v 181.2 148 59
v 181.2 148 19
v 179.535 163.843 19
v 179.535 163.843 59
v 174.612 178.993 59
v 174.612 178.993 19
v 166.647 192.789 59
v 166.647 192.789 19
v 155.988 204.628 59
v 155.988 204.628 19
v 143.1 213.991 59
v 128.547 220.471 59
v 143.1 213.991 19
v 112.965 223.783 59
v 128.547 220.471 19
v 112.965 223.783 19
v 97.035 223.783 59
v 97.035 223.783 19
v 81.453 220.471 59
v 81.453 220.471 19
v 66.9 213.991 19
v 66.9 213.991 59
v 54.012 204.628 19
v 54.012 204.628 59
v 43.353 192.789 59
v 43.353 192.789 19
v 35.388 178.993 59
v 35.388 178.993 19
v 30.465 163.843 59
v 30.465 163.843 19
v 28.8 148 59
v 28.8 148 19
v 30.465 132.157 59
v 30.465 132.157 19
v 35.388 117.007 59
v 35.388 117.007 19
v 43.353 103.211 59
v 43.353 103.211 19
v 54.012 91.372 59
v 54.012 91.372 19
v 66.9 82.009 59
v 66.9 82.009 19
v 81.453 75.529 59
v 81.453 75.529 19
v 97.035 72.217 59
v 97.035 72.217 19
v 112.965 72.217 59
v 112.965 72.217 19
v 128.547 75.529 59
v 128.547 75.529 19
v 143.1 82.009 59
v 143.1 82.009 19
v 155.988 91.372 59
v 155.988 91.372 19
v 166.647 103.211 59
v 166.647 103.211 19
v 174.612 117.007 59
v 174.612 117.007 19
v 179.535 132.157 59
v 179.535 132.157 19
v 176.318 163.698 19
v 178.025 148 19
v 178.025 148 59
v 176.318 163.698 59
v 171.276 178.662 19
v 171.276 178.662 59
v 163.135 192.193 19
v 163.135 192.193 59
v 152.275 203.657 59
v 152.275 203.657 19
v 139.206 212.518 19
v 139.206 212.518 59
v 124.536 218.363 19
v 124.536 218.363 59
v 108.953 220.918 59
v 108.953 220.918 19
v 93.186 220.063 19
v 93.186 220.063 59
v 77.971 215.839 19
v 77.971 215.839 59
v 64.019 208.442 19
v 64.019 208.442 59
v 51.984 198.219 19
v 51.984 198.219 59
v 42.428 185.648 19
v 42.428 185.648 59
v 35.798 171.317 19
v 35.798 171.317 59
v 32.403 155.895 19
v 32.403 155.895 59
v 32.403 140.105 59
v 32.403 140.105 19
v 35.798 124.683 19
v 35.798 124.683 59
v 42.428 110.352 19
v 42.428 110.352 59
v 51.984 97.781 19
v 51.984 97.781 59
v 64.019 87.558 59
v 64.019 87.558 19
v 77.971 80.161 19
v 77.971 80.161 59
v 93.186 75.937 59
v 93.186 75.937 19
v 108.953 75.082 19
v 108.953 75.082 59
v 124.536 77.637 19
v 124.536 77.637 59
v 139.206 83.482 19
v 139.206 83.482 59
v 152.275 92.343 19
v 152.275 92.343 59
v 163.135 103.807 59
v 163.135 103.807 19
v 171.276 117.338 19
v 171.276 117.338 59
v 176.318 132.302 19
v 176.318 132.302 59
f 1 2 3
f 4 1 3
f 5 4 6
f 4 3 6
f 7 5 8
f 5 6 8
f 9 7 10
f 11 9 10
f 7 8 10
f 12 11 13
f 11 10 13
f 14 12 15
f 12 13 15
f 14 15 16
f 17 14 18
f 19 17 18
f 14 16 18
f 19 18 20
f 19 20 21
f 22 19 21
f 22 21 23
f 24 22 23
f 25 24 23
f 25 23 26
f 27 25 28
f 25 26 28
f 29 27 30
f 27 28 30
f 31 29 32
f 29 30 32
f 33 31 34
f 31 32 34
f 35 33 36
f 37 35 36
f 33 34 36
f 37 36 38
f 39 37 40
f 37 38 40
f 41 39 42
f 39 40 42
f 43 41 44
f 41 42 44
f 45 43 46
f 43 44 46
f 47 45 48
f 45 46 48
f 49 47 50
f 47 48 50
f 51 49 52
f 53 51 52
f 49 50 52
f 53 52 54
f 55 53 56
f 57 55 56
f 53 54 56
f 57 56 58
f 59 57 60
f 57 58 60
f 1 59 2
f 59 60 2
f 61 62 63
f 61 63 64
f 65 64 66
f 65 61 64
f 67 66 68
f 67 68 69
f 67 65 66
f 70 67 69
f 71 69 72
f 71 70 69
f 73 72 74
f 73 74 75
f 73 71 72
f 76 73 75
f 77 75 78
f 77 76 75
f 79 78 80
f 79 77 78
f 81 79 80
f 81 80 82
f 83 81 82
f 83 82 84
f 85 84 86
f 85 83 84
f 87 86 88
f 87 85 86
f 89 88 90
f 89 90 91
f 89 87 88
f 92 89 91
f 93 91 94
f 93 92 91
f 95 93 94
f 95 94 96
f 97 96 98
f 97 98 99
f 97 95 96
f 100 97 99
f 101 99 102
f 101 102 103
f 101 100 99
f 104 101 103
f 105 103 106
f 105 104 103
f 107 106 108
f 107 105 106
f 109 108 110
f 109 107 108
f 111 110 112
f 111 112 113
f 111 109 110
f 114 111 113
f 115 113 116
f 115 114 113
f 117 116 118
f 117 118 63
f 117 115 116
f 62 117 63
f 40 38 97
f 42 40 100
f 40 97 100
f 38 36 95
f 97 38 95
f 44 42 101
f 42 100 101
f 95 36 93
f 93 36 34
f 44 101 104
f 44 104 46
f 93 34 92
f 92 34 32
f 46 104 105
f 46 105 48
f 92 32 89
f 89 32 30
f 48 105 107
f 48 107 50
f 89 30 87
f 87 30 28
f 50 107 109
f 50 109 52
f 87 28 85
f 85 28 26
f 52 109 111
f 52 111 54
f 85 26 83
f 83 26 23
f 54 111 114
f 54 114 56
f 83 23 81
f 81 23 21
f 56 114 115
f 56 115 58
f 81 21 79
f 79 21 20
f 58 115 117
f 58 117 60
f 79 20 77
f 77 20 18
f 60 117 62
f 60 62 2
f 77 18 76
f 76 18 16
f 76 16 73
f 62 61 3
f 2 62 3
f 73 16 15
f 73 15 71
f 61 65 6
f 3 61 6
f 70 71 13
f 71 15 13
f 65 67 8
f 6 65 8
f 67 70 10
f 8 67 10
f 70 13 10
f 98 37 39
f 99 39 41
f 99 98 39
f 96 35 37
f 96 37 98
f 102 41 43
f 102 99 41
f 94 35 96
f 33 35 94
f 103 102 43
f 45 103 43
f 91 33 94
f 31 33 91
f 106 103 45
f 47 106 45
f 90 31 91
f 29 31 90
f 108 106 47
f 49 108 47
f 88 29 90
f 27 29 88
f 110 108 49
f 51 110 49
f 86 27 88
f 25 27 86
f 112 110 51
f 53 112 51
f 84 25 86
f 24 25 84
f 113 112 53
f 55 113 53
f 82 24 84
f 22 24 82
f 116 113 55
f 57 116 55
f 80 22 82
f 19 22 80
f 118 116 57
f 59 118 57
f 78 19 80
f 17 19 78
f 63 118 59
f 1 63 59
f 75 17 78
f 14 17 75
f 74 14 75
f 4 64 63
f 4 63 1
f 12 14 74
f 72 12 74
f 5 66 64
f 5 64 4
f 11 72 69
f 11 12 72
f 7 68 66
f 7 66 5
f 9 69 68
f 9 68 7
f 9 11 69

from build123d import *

# Parameters (mm, degrees)
CYLINDER008_R     = 73.025
CYLINDER008_DEPTH = 40
CYLINDER002_R     = 76.2
CYLINDER002_DEPTH = 40


with BuildPart() as chamberwall001:
    # Cylinder008 → Cylinder008 (new body)
    with BuildSketch(Plane(origin=(105, 148, 0), x_dir=(1, 0, 0), z_dir=(0, 0, 1))):
        Circle(CYLINDER008_R)
    extrude(amount=CYLINDER008_DEPTH)


with BuildPart() as chamberwall002:
    # Cylinder002 → Cylinder002 (new body)
    with BuildSketch(Plane(origin=(105, 148, 0), x_dir=(1, 0, 0), z_dir=(0, 0, 1))):
        Circle(CYLINDER002_R)
    extrude(amount=CYLINDER002_DEPTH)

    # Cut: cut ChamberWall001
    add(chamberwall001.part, mode=Mode.SUBTRACT)


with BuildPart() as chamberwall002_1:
    # Cut placement: moved
    add(chamberwall002.part.moved(Location((0, 0, 19))))


solid = chamberwall002_1.part
